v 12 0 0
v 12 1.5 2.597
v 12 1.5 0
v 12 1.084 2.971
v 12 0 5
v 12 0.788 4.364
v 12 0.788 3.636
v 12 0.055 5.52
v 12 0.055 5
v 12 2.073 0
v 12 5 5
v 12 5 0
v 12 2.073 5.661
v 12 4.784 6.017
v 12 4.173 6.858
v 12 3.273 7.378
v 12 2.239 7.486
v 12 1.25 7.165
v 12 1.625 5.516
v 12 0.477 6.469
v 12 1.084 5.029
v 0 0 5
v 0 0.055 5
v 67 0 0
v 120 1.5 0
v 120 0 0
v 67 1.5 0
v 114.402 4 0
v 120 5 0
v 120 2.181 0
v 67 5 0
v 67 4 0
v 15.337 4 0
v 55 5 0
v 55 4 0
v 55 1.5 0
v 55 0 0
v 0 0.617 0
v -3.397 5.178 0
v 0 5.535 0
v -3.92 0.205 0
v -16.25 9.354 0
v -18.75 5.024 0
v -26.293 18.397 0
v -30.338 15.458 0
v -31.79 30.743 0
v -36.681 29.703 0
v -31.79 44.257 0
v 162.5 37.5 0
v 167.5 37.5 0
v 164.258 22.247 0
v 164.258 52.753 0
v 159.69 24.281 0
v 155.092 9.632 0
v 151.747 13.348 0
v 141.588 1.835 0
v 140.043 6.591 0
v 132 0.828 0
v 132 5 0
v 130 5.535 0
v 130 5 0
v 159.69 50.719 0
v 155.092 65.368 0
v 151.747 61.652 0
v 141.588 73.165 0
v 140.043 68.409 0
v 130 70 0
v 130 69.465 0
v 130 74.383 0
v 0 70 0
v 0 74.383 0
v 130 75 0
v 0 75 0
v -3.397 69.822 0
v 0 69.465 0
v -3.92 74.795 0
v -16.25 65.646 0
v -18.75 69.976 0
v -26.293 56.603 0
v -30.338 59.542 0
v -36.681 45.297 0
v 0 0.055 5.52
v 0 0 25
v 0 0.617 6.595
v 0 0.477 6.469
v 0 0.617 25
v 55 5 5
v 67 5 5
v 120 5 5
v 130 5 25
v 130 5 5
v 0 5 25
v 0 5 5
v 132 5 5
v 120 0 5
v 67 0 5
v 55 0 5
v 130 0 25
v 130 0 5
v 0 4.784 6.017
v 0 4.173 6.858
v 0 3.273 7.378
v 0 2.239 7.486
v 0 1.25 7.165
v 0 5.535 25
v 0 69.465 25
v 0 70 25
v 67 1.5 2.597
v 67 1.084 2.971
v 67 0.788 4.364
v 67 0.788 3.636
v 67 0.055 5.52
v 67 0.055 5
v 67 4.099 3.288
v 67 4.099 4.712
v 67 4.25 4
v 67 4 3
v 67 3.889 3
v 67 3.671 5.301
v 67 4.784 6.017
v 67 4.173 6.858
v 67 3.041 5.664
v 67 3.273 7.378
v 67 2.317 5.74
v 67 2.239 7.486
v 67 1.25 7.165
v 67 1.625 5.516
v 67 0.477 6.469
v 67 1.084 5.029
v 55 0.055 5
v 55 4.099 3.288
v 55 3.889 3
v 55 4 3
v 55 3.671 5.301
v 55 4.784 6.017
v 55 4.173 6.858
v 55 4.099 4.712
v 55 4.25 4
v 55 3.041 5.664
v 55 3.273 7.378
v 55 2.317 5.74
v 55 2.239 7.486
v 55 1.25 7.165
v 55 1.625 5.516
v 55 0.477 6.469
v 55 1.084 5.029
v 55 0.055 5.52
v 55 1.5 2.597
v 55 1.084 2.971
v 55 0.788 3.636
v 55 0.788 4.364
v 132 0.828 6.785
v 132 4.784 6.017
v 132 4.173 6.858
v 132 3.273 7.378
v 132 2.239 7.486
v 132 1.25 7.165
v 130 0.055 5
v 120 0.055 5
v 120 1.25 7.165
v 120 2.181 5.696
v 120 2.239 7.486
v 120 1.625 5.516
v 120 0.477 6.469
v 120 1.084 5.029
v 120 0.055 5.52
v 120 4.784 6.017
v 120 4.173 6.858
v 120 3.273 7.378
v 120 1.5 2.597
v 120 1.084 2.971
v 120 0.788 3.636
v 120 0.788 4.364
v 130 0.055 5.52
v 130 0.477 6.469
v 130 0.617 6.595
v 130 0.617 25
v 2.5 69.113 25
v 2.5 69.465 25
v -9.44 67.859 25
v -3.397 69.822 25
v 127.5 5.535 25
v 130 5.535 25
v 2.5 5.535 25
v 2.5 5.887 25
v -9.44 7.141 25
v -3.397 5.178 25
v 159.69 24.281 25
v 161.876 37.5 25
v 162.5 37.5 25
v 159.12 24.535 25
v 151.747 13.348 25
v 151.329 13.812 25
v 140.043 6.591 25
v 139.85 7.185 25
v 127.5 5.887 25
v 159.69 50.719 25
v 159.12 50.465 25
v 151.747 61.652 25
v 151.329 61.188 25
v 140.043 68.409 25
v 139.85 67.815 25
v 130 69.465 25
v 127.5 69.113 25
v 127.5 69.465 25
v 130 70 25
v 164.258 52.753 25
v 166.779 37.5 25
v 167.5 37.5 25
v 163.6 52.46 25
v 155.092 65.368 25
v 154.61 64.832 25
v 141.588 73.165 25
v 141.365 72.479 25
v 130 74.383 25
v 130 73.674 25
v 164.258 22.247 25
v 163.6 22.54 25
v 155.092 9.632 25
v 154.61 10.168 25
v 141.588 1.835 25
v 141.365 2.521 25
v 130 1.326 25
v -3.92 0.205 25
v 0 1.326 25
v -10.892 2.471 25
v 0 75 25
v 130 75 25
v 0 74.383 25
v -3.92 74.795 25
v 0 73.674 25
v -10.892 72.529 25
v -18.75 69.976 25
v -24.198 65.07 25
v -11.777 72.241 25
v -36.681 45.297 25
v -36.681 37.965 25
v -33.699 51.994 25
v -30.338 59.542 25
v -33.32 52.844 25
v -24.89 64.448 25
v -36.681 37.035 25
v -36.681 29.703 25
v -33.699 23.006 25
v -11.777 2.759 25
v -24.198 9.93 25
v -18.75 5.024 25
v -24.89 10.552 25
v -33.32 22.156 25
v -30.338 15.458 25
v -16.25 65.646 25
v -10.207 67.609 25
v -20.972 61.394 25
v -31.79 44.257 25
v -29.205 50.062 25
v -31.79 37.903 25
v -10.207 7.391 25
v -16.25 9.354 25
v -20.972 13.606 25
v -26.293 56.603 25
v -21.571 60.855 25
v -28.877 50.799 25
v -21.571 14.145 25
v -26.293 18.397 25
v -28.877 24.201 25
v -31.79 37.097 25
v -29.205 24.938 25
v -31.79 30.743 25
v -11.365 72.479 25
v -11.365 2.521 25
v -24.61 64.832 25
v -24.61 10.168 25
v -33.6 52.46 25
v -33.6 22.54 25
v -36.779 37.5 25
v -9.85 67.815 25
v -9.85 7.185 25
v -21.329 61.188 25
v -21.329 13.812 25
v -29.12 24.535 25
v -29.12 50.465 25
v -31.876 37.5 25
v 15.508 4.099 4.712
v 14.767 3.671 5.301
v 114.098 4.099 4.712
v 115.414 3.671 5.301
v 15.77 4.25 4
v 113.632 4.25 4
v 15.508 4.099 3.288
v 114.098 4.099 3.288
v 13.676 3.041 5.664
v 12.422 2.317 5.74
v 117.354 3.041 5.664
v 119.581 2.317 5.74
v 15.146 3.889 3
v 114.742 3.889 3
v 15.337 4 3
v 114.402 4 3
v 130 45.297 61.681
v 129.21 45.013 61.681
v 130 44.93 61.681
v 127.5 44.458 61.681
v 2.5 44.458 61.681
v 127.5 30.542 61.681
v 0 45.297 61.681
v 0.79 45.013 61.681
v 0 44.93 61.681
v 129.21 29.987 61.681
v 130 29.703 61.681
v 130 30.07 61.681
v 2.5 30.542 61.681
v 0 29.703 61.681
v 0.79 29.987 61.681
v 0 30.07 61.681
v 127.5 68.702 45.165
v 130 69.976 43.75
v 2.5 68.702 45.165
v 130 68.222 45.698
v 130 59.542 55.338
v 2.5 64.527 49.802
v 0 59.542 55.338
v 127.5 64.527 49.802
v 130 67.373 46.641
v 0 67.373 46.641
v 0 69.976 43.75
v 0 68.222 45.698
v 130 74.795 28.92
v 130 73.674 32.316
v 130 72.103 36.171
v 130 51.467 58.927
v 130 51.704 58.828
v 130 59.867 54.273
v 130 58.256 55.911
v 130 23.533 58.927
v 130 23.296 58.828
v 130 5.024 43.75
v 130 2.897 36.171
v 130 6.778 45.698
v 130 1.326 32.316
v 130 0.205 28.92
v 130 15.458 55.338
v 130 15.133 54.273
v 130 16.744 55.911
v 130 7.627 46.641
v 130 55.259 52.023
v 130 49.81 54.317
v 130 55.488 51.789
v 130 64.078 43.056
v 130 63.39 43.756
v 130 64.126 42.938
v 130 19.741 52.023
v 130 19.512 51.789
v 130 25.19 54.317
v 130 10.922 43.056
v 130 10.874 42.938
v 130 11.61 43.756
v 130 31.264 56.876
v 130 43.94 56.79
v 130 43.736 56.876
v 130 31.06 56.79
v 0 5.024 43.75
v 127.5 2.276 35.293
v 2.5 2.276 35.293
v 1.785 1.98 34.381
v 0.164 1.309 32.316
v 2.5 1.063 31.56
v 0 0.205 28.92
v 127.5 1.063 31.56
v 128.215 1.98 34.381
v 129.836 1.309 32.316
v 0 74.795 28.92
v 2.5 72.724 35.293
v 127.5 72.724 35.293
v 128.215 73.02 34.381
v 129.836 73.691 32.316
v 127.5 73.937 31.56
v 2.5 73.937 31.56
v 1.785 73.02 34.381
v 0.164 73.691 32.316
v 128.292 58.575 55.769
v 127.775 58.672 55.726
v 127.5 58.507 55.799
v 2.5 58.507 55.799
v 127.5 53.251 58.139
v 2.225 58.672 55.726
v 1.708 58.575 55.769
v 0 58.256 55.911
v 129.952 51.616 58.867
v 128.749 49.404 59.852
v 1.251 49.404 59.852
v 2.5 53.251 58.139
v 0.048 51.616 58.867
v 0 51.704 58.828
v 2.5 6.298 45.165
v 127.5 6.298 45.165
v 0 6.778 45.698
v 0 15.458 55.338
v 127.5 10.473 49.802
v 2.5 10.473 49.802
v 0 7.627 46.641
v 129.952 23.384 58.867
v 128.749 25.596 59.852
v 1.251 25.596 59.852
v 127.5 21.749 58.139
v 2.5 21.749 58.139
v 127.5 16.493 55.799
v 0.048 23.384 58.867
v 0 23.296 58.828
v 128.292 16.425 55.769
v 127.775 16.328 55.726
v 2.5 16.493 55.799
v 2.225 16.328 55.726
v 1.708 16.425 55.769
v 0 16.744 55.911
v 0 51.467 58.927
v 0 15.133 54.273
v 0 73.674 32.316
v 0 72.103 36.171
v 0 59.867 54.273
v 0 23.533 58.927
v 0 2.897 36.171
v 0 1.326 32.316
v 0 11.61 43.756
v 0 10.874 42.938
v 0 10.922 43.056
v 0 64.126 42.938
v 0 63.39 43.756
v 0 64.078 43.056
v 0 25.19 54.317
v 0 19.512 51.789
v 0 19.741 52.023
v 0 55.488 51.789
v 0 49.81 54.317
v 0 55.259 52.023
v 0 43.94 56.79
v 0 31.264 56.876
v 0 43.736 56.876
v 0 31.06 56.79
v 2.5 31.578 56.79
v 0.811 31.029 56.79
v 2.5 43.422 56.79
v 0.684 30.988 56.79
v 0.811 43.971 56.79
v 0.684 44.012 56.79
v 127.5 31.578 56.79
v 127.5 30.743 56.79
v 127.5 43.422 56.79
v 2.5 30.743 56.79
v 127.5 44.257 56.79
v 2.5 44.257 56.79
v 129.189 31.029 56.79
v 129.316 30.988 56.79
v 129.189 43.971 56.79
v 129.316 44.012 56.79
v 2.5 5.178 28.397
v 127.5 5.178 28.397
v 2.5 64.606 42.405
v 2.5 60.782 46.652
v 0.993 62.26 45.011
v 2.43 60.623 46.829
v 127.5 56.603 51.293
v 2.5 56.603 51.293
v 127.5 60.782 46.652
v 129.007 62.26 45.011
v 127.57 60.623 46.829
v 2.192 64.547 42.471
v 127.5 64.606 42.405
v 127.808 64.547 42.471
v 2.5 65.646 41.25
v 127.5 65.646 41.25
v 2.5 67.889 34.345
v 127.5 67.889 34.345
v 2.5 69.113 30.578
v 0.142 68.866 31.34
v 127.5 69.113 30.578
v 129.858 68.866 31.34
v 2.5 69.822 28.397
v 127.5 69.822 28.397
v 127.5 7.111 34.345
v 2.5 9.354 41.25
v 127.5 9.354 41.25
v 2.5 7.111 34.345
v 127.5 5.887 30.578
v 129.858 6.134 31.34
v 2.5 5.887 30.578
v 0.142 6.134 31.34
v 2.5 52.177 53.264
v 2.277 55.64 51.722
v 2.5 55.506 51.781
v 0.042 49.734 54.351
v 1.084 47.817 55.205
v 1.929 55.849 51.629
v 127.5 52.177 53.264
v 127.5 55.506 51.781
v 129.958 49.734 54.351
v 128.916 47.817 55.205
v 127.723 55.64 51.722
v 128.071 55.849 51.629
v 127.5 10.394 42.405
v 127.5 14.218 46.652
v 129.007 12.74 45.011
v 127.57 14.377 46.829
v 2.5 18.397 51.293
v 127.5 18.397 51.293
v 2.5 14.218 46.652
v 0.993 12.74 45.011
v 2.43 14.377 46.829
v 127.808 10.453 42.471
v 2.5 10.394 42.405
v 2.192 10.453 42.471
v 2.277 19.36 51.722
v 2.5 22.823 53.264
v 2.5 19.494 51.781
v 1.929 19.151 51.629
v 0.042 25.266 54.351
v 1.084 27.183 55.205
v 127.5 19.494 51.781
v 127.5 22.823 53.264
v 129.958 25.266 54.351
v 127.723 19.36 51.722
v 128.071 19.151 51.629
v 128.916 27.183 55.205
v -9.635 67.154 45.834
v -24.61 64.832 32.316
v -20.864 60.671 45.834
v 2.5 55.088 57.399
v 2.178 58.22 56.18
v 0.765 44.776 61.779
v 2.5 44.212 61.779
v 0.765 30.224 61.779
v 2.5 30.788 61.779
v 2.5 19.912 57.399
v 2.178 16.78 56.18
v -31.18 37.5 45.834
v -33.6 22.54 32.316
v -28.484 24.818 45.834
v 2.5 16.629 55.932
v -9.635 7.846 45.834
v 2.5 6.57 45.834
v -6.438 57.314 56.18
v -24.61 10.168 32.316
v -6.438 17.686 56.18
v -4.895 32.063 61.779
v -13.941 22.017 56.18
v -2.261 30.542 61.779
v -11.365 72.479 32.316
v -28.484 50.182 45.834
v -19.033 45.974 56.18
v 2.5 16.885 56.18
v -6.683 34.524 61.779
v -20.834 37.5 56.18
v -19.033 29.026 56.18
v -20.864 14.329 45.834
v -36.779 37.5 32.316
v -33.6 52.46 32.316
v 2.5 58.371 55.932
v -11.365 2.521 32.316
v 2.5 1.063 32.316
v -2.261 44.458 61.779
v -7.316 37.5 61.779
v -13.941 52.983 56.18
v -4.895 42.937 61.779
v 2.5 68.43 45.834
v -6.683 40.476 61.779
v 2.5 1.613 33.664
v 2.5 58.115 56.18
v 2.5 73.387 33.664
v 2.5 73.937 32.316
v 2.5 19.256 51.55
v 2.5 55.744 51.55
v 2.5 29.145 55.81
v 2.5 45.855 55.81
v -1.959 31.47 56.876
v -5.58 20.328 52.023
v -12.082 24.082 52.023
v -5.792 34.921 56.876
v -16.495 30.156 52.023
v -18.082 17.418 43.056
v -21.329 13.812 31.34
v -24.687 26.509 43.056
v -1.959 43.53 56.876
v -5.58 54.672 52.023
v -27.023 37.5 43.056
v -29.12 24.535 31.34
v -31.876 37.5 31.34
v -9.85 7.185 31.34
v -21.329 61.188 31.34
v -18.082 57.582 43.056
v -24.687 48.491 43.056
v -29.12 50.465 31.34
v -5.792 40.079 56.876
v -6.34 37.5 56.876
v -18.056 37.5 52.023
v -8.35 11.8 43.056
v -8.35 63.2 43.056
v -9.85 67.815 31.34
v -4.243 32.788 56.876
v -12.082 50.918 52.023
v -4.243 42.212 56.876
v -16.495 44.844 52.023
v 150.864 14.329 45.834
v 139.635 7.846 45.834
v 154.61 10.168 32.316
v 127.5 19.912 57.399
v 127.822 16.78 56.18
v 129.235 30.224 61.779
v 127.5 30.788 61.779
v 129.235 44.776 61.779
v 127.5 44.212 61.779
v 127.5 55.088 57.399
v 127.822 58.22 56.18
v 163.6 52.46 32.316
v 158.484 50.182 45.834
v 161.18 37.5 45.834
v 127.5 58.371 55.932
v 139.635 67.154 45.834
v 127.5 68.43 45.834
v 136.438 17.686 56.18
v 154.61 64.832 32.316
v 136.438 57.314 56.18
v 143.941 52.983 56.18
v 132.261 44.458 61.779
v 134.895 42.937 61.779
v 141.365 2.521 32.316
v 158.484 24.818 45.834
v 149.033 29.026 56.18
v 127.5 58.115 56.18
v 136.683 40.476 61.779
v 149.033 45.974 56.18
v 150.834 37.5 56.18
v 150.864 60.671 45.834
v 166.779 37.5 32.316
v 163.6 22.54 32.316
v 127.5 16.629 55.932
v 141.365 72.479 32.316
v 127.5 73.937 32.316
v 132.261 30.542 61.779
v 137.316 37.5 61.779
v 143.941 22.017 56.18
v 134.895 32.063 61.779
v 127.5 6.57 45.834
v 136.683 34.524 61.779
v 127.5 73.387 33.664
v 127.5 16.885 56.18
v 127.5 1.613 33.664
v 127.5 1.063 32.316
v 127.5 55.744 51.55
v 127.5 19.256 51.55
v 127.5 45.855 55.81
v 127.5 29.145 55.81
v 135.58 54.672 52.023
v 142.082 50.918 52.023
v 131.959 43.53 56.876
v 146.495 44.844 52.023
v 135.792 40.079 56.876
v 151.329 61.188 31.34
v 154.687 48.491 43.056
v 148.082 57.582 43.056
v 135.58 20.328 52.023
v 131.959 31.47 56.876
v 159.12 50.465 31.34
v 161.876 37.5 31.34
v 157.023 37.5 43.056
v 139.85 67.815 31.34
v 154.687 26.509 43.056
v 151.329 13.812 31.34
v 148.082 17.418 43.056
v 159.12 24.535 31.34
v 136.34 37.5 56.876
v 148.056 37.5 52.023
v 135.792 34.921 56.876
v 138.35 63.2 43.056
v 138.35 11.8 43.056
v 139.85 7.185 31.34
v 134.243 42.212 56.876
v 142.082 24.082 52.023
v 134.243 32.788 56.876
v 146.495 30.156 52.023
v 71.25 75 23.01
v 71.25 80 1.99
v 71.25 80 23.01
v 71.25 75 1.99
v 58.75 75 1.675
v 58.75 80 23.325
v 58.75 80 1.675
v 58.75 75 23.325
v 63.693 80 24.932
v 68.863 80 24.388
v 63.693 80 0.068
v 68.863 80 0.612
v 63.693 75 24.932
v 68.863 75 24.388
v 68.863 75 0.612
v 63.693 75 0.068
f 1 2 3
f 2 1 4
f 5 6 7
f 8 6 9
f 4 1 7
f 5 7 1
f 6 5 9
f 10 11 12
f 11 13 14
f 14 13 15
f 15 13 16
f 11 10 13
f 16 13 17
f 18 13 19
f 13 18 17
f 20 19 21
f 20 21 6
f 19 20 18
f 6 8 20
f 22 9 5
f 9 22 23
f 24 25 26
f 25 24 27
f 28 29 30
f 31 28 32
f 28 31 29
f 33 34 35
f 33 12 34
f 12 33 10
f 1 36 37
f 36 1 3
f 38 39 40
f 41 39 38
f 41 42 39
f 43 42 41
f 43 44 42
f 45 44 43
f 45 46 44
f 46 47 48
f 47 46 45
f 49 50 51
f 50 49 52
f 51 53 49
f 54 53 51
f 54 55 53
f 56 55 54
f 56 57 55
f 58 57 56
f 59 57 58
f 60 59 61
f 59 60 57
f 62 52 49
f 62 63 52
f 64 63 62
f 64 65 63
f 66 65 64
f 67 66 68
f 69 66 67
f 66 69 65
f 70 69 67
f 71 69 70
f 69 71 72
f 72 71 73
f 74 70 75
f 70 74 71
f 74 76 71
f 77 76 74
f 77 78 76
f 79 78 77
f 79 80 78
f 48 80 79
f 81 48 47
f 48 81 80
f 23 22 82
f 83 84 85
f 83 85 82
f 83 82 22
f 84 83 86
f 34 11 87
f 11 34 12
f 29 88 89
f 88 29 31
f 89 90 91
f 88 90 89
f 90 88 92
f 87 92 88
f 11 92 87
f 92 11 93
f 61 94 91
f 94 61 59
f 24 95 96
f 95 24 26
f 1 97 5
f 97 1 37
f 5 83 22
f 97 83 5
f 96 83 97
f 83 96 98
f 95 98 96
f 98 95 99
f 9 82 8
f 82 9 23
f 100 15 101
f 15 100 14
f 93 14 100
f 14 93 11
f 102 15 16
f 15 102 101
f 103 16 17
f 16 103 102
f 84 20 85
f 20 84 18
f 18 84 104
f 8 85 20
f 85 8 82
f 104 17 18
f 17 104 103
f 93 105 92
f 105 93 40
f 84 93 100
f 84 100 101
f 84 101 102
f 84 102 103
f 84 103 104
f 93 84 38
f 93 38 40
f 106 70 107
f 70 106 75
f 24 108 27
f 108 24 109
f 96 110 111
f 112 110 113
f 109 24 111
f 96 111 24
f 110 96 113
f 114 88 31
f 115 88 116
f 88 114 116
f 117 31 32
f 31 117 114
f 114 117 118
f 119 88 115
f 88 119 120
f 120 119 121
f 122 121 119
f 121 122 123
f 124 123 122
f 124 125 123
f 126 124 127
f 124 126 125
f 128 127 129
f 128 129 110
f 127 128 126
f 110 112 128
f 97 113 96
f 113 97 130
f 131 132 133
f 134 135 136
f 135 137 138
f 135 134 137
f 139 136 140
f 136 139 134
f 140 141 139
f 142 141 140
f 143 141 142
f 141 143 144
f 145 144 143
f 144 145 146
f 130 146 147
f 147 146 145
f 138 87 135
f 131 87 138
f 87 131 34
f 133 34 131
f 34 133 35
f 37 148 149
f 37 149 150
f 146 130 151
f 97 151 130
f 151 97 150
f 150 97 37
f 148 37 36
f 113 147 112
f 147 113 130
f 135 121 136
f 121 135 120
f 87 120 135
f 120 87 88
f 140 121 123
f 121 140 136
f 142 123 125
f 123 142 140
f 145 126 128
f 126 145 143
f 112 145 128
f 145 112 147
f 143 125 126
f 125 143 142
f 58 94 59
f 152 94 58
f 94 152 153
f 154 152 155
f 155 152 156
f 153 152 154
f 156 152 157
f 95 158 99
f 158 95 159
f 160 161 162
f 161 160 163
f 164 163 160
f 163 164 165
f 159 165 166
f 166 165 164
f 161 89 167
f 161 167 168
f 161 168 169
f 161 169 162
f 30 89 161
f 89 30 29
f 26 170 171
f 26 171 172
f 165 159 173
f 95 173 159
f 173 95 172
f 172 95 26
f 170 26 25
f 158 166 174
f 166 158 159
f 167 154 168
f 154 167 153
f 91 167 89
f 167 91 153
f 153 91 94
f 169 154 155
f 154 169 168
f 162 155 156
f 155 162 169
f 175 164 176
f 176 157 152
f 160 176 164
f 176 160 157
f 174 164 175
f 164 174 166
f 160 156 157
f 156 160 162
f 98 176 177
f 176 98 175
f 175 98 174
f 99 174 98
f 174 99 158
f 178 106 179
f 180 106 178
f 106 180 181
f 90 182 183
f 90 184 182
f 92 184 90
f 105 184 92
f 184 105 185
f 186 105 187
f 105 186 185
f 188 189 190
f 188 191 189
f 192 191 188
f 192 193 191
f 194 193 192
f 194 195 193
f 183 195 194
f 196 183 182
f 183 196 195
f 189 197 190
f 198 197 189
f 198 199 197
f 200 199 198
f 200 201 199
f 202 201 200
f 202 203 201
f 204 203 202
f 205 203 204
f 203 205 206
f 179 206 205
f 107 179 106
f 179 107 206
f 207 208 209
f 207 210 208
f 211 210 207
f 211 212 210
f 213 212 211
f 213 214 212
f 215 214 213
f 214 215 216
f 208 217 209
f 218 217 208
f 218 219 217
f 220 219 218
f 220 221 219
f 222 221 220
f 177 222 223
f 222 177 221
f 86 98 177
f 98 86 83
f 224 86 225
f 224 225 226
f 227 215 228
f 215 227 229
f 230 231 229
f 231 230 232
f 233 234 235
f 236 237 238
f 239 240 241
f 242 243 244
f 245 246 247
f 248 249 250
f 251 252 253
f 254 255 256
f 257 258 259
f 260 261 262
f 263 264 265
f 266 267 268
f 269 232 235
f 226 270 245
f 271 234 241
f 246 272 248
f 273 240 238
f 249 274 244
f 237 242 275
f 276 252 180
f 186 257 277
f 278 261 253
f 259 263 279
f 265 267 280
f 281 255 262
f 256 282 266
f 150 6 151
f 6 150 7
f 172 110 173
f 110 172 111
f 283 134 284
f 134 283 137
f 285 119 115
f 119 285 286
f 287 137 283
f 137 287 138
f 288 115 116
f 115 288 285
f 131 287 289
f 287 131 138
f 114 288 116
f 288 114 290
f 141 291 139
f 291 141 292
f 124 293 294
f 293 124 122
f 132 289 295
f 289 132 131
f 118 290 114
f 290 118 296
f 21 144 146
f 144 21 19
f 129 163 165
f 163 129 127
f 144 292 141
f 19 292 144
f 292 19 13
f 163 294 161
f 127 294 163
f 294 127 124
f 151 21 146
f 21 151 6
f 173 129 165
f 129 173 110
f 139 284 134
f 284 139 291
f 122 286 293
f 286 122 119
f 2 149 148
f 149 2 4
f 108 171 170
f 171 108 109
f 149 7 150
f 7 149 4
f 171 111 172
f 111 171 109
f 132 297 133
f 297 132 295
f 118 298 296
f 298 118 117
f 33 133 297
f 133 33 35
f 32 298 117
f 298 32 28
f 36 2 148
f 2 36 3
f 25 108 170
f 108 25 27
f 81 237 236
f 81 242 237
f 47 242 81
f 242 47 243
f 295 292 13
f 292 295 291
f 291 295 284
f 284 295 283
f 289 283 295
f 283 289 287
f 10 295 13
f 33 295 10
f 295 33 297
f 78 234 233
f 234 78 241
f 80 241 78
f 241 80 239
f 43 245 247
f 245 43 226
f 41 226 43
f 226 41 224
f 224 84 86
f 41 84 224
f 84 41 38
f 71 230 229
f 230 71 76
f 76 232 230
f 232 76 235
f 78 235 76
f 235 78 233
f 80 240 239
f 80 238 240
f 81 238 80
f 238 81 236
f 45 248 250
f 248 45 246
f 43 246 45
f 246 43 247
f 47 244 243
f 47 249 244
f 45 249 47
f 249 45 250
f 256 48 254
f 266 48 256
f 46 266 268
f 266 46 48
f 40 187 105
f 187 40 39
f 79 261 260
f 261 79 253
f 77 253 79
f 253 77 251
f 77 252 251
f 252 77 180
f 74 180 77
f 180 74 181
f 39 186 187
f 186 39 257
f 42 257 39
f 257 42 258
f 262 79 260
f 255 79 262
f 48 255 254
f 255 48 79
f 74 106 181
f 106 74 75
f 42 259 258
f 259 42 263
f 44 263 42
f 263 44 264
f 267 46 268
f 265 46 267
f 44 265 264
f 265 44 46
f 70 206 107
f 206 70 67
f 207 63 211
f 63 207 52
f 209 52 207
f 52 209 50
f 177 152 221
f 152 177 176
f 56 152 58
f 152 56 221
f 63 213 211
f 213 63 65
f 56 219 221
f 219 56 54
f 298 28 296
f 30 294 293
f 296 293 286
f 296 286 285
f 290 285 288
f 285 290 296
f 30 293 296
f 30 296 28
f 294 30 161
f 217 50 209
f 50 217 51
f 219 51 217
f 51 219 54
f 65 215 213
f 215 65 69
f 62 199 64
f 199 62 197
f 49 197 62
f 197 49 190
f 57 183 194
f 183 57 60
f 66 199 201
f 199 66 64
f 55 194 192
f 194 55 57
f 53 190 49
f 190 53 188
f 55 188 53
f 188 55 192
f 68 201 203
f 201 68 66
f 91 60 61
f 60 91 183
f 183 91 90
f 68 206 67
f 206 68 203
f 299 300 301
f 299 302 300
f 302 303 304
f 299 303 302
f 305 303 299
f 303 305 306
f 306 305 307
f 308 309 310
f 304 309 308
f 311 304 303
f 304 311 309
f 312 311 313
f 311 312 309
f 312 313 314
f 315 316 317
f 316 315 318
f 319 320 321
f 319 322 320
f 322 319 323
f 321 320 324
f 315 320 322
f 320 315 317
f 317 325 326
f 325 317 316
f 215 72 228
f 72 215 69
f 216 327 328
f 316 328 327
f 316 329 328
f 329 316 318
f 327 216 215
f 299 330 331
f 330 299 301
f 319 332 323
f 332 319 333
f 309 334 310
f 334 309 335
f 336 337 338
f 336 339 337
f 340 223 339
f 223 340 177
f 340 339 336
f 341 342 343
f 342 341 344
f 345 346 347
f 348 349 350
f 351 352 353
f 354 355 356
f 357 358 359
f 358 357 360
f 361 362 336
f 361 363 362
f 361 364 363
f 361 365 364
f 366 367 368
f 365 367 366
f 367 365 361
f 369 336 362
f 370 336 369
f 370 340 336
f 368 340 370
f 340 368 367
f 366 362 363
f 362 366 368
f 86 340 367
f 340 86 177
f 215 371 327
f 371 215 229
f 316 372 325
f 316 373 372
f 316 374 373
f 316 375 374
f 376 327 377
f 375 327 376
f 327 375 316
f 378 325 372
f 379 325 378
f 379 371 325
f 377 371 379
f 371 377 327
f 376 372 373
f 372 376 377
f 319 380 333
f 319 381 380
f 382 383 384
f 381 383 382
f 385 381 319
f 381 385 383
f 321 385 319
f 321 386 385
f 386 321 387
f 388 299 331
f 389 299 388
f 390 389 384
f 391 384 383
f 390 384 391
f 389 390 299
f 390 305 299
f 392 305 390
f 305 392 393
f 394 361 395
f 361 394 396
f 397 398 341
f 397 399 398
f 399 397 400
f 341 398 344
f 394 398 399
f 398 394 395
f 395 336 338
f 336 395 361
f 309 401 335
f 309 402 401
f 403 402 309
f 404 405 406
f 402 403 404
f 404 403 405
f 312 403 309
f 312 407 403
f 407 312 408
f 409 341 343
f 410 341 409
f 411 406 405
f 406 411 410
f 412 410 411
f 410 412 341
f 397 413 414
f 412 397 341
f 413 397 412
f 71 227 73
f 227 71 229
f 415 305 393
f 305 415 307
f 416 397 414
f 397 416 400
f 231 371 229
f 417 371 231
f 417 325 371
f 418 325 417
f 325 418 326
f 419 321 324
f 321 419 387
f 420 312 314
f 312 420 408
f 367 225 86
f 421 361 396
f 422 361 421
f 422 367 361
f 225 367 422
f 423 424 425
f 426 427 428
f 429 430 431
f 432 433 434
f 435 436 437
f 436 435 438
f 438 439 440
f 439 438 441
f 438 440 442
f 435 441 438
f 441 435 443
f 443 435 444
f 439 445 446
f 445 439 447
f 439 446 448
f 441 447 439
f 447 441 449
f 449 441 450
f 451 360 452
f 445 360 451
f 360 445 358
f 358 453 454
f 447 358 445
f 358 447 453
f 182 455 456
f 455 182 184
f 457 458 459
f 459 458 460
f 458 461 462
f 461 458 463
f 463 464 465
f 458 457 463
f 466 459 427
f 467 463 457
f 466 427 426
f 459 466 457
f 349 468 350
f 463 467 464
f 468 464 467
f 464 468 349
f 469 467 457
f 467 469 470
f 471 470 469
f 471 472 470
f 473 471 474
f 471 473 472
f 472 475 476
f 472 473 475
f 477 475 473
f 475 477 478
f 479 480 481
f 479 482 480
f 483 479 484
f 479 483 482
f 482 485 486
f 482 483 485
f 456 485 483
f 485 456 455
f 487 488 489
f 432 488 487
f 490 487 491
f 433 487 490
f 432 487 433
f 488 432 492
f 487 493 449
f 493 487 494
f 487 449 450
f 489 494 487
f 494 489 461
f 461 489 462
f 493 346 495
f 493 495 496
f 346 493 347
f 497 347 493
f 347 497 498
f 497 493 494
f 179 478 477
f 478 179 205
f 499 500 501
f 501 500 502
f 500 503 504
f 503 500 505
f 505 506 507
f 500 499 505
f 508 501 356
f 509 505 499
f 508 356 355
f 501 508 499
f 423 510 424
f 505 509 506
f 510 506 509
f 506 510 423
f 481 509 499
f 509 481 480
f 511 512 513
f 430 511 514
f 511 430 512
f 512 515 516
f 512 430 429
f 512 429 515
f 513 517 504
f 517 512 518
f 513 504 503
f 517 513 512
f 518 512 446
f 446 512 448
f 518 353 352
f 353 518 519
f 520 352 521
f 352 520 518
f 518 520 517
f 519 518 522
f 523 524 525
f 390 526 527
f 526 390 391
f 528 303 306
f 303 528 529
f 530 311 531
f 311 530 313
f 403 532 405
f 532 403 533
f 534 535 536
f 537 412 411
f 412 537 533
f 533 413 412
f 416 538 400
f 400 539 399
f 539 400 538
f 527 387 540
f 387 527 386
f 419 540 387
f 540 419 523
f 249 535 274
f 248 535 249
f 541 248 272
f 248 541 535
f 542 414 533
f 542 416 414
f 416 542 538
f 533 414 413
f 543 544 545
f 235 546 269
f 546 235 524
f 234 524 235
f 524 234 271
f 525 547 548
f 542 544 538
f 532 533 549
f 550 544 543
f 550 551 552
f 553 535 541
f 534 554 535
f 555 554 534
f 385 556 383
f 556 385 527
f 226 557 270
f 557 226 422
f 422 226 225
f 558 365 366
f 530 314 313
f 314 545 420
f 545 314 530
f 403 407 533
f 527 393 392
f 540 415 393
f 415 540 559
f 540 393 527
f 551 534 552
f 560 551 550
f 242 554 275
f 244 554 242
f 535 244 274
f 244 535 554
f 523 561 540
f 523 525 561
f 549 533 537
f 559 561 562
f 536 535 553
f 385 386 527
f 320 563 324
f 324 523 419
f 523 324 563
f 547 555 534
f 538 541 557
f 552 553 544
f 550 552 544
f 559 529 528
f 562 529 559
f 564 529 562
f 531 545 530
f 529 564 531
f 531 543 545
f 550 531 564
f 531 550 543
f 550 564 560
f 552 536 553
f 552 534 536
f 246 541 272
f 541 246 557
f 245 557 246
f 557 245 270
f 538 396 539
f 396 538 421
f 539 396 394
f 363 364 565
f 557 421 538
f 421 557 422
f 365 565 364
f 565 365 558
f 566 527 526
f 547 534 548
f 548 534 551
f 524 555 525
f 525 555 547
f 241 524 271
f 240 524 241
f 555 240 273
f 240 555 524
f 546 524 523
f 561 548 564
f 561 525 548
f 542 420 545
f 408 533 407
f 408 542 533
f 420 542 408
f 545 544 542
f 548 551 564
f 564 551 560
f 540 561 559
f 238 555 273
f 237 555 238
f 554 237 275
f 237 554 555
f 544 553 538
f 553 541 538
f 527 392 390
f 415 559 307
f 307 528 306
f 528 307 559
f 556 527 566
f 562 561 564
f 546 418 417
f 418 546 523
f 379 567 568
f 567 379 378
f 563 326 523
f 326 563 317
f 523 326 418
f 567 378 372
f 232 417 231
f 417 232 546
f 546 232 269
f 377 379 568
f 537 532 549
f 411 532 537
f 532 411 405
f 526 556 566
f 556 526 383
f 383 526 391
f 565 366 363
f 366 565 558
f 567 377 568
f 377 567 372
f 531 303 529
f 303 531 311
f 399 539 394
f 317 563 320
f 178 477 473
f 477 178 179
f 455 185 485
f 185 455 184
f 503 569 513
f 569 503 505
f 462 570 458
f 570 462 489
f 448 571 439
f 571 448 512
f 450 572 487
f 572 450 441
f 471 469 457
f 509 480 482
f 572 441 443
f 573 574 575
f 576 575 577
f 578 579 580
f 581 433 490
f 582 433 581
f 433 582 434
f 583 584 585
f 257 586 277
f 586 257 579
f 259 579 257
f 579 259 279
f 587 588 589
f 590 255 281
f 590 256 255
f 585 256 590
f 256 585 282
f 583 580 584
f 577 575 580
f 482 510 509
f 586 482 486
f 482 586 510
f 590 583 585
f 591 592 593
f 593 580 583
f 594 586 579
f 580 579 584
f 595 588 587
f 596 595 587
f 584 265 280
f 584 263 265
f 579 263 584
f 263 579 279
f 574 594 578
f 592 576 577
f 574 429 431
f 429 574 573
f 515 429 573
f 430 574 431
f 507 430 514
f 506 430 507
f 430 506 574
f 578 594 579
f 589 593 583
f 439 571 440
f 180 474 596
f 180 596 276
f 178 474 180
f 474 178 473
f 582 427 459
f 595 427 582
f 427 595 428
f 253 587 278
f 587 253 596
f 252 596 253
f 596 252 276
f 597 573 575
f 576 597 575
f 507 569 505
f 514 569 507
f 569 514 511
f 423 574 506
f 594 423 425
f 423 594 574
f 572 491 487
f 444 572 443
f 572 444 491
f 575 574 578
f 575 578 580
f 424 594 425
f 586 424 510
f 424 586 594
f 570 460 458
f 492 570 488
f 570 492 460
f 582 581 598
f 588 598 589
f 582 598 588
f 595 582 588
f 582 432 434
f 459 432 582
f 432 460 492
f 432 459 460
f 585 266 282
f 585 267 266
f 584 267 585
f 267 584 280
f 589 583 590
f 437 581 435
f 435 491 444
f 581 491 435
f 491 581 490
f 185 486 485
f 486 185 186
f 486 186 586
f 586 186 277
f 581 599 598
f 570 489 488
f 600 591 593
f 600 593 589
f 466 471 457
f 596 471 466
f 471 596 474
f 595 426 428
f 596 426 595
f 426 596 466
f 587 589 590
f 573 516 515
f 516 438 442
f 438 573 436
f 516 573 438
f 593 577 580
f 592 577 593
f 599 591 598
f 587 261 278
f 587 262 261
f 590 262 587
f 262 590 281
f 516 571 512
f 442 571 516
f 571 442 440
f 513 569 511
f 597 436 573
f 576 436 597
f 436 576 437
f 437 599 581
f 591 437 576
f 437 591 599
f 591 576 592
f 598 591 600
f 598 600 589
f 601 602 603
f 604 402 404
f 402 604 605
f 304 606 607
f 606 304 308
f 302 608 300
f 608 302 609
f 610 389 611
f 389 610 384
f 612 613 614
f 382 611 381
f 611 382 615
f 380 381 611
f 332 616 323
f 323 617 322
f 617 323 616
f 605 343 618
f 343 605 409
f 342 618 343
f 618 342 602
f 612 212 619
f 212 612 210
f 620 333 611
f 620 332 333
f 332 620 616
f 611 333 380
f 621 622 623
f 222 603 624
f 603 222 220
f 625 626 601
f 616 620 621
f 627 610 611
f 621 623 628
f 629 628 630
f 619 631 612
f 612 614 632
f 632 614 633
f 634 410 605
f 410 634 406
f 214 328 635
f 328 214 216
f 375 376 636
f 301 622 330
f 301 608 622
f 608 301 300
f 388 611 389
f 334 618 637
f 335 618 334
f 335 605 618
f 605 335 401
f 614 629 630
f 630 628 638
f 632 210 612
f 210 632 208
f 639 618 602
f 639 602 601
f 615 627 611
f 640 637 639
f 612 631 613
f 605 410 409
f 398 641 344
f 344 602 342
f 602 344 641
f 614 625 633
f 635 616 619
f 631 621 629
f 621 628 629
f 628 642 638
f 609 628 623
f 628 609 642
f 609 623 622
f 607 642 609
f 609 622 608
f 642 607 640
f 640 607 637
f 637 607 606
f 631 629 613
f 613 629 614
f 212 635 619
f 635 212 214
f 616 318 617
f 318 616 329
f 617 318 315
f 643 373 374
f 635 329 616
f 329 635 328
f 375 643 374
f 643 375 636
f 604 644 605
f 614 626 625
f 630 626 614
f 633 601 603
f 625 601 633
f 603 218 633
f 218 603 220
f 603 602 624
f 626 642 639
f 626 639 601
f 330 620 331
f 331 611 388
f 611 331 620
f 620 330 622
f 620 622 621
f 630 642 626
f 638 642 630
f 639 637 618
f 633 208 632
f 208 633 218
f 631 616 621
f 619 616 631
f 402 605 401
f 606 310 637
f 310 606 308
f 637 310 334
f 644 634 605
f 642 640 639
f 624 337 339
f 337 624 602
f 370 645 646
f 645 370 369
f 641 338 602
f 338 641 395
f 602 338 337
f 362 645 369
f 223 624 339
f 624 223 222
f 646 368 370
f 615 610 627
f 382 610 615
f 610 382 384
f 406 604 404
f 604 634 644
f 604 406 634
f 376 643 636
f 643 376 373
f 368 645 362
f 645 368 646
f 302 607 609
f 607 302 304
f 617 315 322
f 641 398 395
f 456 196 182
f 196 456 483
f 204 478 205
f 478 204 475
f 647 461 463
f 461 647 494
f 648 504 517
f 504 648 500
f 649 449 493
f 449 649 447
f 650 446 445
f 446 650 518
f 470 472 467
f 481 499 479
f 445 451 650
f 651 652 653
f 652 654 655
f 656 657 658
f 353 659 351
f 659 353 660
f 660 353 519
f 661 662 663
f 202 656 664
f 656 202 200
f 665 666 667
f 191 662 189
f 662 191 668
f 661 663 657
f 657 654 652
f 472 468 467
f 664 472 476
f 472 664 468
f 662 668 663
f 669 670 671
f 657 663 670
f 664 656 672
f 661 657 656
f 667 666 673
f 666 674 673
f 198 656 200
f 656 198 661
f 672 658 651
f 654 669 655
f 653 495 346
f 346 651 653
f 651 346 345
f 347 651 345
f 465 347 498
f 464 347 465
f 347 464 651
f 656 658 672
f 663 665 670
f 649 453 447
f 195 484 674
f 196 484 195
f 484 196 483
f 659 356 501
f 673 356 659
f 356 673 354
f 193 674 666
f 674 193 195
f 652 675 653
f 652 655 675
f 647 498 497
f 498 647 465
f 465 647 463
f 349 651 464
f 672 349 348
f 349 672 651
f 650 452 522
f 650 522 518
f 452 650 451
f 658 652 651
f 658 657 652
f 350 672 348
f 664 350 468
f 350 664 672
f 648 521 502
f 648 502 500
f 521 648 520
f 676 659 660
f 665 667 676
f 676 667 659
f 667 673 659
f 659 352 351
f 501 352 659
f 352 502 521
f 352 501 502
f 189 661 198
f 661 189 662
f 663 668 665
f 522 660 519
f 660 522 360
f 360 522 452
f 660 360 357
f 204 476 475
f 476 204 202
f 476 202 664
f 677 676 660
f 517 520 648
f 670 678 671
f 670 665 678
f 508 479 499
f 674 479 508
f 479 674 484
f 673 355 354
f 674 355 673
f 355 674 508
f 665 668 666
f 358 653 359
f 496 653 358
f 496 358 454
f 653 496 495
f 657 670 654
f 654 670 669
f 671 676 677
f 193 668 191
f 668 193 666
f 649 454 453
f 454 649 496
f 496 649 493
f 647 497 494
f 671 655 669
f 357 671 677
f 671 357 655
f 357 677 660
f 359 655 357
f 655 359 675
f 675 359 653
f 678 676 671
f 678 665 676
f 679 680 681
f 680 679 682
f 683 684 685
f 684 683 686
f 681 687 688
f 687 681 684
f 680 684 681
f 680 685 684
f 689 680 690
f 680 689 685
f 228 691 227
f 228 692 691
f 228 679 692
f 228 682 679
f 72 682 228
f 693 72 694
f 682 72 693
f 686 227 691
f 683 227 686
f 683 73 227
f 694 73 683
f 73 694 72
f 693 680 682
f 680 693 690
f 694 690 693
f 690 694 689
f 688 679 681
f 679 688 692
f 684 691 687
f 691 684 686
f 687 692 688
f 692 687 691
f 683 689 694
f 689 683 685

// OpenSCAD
$fn=15;

//The variables hcoffre, lcoffrex,lcoffrey and llamey represent in the same order: 1) the height of the object 2) the lenght of the object 3) the width of the object 4) the thickness of the object. All values can be changed but it is recommended not to change the "llamey" value for the fonctionnality of the object. For this part, it is recommended to use 1/2 of the "hcoffre" value than the one used for the base.

hcoffre= 25;
lcoffrex= 130;
llamey= 5;
lcoffrey=70;


module head(coffrex,coffrey,coffrez){

//the first part of text represents the head's sides (base) of the pencil case

	difference(){union(){difference(){cube([coffrex,llamey,coffrez]) ;
union(){union() {translate([0,0,0])cube([llamey+llamey+2,llamey,5]) ;

rotate([90,0,90])translate([llamey/2,llamey,0])cylinder(h=llamey+llamey+2,r=llamey/2) ;}

translate([lcoffrex/2-10,0,0])union() {translate([0,0,0])cube([llamey+llamey+2,llamey,5]) ;

rotate([90,0,90])translate([llamey/2,llamey,0])cylinder(h=llamey+llamey+2,r=llamey/2) ;}

translate([lcoffrex-10,0,0])union() {translate([0,0,0])cube([llamey+llamey+2,llamey,5]) ;

rotate([90,0,90])translate([llamey/2,llamey,0])cylinder(h=12,r=llamey/2) ;}}}}translate([0,llamey/2,4])rotate([90,0,90])cylinder(h=lcoffrex,r=llamey/4+0.5);translate([0,1.5,0])cube([lcoffrex,2.5,3]);}

translate([0,lcoffrey,0])cube([coffrex,llamey,coffrez]) ;

//the second part of the codes represents the cover of the pencil case

difference(){	union(){difference(){translate([0,lcoffrey/2+llamey/2,0])cylinder(h=hcoffre,r=lcoffrey/2+llamey/2);
translate([0,lcoffrey/2+llamey/2,0])cylinder(h=hcoffre,r=lcoffrey/2-llamey/2) ;translate([0,llamey,0])cube([lcoffrex/2,lcoffrey-llamey,hcoffre]); }}union() {translate([0,0,0])cube([llamey+llamey+2,llamey,5]) ;

rotate([90,0,90])translate([llamey/2,llamey,0])cylinder(h=llamey+llamey+2,r=llamey/2) ;}}

difference(){	union(){difference(){translate([lcoffrex,lcoffrey/2+llamey/2,0])cylinder(h=hcoffre,r=lcoffrey/2+llamey/2) ;
translate([lcoffrex,lcoffrey/2+llamey/2,0])cylinder(h=hcoffre,r=lcoffrey/2-llamey/2) ;translate([lcoffrex/2,llamey,0])cube([lcoffrex/2,lcoffrey-llamey,hcoffre]); }}union(){translate([lcoffrex-10,0,0])union() {translate([0,0,0])cube([llamey+llamey+2,llamey,5]);

rotate([90,0,90])translate([llamey/2,llamey,0])cylinder(h=llamey+llamey+2,r=llamey/2) ;}}}

translate([0,lcoffrey/2+llamey/2,hcoffre])rotate([0,90,0])difference(){cylinder(h=lcoffrex,r=lcoffrey/2+llamey/2);cylinder(h=lcoffrex,r=lcoffrey/2-llamey/2);translate([0,-lcoffrey/2+llamey/2,0])cube([lcoffrey/2+5,lcoffrey-llamey,lcoffrex]);}

translate([llamey/2,0,hcoffre])translate([0,lcoffrey+llamey])rotate([0,0,180])translate([-lcoffrey/2,0,-lcoffrey])difference(){translate([lcoffrey/2+llamey/2,lcoffrey/2+llamey/2,lcoffrey])sphere(d=lcoffrey+llamey);cube([lcoffrey+llamey,lcoffrey+llamey,lcoffrey]);cube([lcoffrey/2,lcoffrey+llamey,lcoffrey+lcoffrey/2+llamey]);translate([lcoffrey/2+llamey/2,lcoffrey/2+llamey/2,lcoffrey])sphere(d=lcoffrey-llamey);}

translate([lcoffrex-llamey/2,0,hcoffre])translate([-lcoffrey/2,0,-lcoffrey])difference(){translate([lcoffrey/2+llamey/2,lcoffrey/2+llamey/2,lcoffrey])sphere(d=lcoffrey+llamey);cube([lcoffrey+llamey,lcoffrey+llamey,lcoffrey]);cube([lcoffrey/2,lcoffrey+llamey,lcoffrey+lcoffrey/2+llamey]);translate([lcoffrey/2+llamey/2,lcoffrey/2+llamey/2,lcoffrey])sphere(d=lcoffrey-llamey);}

//the last part of the code represent the badge in front of the pencil case for the chest aesthetics

intersection(){translate([lcoffrex/2-hcoffre/4,lcoffrey+llamey,0])cube([hcoffre/2,llamey,hcoffre]);
translate([lcoffrex/2,lcoffrey+llamey+llamey,hcoffre/2])rotate([90,0,0])cylinder(h=llamey,r=hcoffre/2);}
}

translate([0,0,0])head(lcoffrex,lcoffrey,hcoffre);


